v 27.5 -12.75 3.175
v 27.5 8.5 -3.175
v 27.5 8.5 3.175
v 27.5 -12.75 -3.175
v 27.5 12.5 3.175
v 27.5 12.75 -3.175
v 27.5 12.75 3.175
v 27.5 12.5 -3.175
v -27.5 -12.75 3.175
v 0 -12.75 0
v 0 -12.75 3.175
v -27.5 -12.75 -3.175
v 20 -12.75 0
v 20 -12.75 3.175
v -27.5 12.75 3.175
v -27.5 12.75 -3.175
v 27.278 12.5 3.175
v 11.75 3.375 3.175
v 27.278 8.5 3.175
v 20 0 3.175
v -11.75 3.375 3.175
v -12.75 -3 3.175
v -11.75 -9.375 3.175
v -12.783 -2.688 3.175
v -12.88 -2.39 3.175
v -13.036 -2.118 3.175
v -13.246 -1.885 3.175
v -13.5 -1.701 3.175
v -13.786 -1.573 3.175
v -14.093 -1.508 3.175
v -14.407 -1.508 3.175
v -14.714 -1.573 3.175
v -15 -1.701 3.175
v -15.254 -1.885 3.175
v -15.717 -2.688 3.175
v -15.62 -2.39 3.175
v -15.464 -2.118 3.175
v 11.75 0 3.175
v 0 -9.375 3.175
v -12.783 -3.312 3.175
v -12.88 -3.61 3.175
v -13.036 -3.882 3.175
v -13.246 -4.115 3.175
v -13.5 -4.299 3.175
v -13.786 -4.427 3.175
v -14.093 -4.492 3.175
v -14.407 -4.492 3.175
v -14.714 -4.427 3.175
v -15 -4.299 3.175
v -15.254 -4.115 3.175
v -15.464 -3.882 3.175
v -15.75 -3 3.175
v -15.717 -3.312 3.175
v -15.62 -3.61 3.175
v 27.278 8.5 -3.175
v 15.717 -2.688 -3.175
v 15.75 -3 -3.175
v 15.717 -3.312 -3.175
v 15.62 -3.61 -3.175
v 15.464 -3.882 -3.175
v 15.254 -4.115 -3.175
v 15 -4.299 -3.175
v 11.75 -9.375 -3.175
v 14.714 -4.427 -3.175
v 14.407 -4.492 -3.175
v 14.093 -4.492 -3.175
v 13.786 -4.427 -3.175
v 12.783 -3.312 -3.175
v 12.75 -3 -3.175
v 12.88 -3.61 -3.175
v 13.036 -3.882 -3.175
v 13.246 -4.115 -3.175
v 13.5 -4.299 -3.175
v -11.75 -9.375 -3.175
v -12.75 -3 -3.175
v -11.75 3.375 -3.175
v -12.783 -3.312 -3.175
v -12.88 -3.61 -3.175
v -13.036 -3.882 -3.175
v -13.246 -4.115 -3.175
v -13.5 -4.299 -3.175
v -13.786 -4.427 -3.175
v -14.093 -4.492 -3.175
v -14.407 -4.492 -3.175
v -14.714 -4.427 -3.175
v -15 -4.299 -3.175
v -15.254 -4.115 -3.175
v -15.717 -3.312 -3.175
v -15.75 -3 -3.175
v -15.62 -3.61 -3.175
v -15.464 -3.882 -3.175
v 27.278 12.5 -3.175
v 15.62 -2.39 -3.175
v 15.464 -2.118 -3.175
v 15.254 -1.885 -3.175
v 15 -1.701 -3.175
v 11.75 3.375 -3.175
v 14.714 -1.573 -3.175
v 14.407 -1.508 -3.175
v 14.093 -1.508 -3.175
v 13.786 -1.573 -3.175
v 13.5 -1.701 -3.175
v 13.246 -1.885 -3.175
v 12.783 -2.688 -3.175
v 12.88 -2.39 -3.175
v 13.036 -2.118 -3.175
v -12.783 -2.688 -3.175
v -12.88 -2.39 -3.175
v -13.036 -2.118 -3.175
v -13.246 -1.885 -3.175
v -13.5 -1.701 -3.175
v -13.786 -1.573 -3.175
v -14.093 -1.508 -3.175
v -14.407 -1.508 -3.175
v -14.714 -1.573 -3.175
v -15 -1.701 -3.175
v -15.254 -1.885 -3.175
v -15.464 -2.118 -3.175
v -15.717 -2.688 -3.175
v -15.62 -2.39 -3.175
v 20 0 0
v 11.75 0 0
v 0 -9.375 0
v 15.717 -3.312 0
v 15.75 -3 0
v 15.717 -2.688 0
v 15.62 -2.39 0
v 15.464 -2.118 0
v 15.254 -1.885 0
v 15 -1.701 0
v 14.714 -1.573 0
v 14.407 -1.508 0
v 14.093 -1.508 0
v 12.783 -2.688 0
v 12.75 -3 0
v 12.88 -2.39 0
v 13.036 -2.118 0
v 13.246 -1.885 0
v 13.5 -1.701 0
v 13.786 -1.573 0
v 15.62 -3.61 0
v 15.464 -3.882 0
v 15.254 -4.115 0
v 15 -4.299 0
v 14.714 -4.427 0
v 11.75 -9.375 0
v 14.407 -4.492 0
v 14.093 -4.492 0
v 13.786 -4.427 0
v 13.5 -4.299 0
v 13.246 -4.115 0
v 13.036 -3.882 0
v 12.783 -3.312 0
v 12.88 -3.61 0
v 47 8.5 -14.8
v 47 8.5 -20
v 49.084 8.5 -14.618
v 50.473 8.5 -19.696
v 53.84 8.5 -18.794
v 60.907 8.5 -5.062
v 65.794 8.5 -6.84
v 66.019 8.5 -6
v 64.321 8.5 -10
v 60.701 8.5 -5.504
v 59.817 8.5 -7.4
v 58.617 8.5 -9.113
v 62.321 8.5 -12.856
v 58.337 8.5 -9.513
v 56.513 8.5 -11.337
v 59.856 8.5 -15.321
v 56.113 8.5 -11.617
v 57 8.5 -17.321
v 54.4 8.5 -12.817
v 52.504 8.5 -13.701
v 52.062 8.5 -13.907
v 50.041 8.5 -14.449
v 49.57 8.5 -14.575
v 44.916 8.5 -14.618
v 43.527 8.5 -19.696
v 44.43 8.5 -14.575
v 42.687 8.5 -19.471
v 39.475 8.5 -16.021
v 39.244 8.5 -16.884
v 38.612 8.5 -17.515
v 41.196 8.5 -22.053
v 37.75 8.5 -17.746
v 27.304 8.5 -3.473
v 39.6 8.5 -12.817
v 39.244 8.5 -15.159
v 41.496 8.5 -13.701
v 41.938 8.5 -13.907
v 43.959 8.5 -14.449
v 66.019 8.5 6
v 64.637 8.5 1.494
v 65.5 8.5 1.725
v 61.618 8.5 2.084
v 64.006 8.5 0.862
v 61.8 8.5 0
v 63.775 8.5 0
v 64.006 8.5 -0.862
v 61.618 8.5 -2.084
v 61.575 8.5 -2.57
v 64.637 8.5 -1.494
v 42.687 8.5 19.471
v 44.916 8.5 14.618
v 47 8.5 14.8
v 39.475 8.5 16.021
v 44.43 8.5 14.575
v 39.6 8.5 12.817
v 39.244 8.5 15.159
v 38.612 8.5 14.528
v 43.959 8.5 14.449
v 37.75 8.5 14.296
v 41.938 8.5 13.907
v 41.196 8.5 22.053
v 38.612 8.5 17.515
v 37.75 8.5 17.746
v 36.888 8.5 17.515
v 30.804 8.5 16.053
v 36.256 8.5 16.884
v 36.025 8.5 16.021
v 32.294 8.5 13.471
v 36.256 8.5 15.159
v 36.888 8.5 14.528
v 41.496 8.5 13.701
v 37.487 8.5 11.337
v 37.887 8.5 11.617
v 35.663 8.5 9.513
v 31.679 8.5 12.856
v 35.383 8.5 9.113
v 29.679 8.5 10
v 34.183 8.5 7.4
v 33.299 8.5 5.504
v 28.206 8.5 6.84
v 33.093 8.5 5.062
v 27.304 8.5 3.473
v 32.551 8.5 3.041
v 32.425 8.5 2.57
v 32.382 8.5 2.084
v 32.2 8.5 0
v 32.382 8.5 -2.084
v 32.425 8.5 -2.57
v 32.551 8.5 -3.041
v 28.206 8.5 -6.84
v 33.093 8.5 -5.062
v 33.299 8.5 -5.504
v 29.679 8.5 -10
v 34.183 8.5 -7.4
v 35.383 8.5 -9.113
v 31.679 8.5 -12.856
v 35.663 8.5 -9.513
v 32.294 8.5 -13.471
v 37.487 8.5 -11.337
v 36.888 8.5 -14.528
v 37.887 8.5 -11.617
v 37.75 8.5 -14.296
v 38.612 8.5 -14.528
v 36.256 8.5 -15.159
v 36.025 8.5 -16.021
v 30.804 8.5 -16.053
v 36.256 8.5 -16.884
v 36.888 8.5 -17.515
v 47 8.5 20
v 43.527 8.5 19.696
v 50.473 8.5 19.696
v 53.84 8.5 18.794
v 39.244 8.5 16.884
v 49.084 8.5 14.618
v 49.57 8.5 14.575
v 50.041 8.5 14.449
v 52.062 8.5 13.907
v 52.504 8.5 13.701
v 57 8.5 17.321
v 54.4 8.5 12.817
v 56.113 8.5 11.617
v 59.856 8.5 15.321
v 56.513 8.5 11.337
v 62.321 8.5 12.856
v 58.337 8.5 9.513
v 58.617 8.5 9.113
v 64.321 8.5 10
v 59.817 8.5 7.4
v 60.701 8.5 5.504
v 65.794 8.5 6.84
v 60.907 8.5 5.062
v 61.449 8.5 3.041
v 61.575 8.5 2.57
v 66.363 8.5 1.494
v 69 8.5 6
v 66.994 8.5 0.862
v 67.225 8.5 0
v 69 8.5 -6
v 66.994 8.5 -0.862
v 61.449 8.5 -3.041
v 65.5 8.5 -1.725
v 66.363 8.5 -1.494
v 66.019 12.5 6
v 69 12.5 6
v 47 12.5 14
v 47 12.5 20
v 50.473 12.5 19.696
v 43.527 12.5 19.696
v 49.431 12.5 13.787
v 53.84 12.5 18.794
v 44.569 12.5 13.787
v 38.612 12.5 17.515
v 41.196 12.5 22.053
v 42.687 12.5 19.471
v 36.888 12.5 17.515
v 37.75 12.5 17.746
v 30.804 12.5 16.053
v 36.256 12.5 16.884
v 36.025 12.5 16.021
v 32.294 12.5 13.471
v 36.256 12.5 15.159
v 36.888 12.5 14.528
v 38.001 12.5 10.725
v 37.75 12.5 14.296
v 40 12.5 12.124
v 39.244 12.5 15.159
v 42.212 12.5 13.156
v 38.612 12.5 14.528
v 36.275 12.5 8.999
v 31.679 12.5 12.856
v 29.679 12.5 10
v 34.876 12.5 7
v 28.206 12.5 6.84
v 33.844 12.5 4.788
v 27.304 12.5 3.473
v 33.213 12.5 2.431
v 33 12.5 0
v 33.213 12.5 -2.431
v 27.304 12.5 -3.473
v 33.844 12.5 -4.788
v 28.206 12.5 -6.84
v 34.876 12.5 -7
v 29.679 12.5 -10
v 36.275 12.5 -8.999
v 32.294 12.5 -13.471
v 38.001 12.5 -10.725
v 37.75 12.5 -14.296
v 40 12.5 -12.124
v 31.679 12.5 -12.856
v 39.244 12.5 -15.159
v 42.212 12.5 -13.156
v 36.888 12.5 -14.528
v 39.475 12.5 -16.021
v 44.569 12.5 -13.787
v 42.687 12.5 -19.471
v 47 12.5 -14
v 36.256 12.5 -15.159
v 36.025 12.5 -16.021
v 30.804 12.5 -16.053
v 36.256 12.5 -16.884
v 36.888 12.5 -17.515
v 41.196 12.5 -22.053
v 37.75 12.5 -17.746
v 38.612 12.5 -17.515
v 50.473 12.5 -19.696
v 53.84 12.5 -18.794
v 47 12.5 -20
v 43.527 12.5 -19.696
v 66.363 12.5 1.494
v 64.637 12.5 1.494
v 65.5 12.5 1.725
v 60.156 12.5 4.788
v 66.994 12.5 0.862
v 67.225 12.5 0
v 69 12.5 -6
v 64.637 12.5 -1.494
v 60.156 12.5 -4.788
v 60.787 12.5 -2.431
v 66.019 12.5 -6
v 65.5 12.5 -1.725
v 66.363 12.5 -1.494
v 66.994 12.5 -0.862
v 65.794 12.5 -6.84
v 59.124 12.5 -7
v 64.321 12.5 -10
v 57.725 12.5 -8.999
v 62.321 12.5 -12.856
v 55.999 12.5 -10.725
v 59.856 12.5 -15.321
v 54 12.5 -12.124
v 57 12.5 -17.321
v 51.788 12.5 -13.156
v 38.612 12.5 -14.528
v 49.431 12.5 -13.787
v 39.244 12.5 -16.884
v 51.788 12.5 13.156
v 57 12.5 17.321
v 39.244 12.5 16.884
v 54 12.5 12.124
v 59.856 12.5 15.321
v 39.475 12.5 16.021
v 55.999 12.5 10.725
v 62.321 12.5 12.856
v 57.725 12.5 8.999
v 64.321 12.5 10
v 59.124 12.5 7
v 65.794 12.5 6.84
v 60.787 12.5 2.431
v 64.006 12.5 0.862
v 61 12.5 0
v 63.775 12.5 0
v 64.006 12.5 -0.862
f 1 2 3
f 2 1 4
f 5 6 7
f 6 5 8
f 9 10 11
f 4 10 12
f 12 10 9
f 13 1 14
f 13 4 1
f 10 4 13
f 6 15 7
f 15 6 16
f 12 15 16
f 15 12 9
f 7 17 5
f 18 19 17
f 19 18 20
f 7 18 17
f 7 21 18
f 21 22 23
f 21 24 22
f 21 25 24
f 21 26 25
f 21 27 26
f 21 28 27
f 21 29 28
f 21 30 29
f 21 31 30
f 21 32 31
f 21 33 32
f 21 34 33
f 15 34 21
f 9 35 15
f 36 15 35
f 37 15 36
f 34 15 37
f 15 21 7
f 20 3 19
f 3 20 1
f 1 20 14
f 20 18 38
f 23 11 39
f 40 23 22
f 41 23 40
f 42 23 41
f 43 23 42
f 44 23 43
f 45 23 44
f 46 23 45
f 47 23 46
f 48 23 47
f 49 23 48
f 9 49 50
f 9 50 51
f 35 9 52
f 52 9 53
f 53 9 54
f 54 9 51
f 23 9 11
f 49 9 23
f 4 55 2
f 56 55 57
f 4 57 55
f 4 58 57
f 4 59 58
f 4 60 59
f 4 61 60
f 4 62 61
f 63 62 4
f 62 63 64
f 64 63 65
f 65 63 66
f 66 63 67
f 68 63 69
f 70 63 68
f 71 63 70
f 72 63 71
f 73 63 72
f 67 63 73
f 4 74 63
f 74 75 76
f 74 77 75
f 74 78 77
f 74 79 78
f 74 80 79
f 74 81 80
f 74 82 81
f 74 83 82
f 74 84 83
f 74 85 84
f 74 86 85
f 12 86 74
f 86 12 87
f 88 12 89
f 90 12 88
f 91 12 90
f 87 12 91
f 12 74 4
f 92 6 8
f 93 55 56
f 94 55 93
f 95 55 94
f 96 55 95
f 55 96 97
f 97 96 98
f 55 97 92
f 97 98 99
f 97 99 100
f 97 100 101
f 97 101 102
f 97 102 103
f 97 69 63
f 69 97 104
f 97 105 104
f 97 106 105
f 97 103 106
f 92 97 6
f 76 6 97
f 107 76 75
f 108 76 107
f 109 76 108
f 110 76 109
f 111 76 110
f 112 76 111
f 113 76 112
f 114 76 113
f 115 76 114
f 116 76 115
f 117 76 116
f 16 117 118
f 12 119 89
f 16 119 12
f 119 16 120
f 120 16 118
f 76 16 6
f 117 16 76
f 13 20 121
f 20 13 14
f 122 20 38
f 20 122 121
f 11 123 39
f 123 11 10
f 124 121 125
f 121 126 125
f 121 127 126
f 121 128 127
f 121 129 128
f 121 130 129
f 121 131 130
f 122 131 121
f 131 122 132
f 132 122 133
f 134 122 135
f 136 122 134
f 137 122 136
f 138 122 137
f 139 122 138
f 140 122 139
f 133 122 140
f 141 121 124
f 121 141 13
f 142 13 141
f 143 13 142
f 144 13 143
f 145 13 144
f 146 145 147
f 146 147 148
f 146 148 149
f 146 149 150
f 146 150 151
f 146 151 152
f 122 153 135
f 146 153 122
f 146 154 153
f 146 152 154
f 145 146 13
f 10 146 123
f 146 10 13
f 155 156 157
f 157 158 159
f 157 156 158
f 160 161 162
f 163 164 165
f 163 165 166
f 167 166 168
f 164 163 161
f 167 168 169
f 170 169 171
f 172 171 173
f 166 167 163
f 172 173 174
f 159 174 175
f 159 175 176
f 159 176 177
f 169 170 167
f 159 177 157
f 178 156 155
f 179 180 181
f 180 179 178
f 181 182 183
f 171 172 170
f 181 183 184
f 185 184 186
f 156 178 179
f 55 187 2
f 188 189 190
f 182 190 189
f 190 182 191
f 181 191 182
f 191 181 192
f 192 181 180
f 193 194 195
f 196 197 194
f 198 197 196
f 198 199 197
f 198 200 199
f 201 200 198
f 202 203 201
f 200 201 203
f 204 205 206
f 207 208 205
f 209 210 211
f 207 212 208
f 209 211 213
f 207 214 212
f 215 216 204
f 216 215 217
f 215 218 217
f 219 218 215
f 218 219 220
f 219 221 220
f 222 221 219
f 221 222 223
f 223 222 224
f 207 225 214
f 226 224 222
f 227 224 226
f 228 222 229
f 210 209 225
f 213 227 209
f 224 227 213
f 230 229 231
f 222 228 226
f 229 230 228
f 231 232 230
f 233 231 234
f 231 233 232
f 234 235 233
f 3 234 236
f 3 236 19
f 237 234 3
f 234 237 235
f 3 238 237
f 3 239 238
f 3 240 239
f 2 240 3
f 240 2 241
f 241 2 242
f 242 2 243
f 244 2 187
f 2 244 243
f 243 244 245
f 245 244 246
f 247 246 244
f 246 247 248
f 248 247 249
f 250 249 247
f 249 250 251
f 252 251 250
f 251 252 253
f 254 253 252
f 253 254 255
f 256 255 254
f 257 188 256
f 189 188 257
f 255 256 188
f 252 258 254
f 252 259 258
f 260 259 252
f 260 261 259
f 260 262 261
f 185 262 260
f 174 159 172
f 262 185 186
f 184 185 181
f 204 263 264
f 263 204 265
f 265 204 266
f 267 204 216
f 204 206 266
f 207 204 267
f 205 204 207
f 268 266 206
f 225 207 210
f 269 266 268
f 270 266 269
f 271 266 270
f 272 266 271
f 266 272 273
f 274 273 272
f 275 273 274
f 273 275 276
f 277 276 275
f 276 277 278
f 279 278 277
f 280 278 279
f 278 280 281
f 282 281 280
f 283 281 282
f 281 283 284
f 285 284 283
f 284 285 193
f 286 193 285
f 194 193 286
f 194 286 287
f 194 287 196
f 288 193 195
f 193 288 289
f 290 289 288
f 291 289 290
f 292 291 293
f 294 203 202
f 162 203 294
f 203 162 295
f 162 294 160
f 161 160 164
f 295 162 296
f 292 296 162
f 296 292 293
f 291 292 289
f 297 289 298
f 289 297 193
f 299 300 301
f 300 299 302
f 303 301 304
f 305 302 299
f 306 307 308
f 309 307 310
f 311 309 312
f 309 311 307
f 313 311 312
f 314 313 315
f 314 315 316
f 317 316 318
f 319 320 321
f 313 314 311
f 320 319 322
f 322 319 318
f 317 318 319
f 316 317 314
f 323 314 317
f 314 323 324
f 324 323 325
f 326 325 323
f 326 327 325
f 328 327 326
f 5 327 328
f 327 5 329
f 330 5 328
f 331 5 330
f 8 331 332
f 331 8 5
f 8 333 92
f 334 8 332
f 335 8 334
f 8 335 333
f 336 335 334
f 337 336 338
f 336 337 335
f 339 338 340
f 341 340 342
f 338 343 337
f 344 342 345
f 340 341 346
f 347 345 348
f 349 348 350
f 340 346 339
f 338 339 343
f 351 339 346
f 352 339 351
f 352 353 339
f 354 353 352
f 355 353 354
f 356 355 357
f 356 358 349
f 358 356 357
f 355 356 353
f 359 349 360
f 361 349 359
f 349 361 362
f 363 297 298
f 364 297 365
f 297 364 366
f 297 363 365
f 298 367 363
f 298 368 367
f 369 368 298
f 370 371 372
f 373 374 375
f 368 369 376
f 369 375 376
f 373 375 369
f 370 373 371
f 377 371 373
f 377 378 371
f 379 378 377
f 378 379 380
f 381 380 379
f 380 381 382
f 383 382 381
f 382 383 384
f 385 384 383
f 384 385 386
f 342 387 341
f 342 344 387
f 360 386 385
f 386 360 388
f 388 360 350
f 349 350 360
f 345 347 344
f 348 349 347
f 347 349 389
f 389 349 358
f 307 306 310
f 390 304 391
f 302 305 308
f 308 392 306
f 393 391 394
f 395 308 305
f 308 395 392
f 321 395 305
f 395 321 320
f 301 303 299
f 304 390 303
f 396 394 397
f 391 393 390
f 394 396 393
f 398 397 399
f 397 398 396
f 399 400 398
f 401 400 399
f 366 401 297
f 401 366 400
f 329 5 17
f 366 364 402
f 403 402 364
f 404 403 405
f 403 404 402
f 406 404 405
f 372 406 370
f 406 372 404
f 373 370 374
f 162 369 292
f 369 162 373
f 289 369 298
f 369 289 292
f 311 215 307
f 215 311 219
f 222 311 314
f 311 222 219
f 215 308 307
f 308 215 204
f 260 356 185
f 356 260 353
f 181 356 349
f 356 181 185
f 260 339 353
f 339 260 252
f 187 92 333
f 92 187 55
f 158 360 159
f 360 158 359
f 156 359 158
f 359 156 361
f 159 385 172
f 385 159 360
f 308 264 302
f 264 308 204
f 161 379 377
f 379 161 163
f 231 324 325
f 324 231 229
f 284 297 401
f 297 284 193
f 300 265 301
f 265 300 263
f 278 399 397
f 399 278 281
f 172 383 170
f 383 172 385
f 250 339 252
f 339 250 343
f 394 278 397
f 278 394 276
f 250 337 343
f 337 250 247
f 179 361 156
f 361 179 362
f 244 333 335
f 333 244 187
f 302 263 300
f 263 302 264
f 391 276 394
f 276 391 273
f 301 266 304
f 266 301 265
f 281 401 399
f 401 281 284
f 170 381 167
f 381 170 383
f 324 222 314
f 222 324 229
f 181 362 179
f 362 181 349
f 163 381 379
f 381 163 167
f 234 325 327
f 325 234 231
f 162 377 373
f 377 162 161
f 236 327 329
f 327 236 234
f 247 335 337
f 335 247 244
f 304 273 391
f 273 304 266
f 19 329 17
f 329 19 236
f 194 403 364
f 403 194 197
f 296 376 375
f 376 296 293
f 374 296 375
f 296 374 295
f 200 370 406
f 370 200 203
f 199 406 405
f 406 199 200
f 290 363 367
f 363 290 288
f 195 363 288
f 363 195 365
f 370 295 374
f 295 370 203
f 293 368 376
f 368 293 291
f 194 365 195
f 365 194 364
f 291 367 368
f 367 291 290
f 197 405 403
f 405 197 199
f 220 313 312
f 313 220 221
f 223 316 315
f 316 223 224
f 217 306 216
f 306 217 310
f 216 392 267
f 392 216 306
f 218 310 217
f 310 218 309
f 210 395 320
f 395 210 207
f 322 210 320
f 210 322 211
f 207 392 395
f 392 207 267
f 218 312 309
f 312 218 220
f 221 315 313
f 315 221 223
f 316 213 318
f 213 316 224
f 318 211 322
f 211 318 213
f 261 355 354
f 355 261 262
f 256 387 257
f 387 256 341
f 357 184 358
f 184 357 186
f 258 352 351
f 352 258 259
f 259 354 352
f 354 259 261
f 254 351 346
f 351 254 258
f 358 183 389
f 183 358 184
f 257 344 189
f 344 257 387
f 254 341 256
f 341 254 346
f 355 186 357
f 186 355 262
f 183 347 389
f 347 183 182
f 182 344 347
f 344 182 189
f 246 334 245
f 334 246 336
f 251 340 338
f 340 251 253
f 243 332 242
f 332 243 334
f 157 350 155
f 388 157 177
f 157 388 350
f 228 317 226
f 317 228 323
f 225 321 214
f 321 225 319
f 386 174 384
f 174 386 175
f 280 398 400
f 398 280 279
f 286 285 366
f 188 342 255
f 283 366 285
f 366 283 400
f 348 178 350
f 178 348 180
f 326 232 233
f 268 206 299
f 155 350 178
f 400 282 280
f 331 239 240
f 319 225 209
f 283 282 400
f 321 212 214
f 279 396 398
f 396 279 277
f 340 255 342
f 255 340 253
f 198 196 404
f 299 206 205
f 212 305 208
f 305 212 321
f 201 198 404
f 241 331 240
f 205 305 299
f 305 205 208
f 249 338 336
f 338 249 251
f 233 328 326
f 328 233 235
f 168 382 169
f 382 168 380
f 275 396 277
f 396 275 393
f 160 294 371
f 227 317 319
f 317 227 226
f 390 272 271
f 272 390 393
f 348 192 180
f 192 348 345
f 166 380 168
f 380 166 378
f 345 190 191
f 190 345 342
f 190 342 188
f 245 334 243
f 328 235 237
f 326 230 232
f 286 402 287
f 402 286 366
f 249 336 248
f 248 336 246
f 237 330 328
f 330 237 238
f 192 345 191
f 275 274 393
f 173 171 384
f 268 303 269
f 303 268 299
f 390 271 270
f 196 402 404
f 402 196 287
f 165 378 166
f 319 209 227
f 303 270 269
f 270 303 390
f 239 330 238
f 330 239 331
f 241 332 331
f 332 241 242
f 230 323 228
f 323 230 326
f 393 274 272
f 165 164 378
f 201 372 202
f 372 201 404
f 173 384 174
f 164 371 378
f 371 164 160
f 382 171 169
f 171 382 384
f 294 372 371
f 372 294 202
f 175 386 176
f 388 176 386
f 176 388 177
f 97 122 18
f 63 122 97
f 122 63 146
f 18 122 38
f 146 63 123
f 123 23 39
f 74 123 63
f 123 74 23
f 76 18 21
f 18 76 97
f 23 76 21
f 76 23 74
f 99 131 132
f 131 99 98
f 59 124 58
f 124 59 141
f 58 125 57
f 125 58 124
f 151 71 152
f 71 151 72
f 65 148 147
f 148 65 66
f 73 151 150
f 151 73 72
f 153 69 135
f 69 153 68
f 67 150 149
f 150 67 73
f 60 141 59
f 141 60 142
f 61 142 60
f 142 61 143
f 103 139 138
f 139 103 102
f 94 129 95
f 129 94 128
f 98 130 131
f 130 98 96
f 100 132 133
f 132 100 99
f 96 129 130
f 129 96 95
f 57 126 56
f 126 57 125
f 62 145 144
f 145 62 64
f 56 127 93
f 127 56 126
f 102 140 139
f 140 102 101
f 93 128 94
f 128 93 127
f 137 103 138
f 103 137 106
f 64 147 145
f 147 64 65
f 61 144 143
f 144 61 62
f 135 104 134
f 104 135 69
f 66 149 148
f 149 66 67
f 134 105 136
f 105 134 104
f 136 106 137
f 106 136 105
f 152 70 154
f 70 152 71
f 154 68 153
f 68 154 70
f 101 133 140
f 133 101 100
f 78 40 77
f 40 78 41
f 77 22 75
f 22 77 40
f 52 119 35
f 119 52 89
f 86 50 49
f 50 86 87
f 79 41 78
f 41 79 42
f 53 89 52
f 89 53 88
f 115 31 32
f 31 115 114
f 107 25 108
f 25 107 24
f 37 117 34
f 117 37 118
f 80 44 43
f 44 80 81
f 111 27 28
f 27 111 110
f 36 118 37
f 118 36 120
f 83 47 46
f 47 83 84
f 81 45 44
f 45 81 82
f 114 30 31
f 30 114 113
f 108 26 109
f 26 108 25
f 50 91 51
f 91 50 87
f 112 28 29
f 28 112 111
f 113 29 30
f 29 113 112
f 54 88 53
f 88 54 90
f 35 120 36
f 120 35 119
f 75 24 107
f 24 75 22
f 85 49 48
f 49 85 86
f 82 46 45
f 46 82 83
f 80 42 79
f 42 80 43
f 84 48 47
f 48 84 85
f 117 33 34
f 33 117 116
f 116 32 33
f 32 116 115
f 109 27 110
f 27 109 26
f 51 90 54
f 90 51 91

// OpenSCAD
// file: configuration.scad
// Increase this if your slicer or printer make holes too tight.
extra_radius = 0.1;

// OD = outside diameter, corner to corner.
m3_nut_od = 6.1;
m3_nut_radius = m3_nut_od/2 + 0.2 + extra_radius;

// Major diameter of metric 3mm thread.
m3_major = 2.85;
m3_radius = m3_major/2 + extra_radius;
m3_wide_radius = m3_major/2 + extra_radius + 0.2;

// NEMA17 stepper motors.
motor_shaft_diameter = 5;
motor_shaft_radius = motor_shaft_diameter/2 + extra_radius;

// Frame brackets. M3x8mm screws work best with 3.6 mm brackets.
thickness = 3.6;

// OpenBeam or Misumi. Currently only 15x15 mm, but there is a plan
// to make models more parametric and allow 20x20 mm in the future.
extrusion = 15;
// main file
//////////////////////////////////////////////////////////////////////////////////////
// Mount for a servo for autoleveling
// modified servo_mount.scad 12/12/13 by zennmaster (thing:167440)
// last modified: 12/14/13
/////////////////////////////////////////////////////////////////////////////////////
include <configuration.scad>;
// From Auto Bed Level
// http://www.thingiverse.com/thing:209384/#files
separation = 44;  // Distance between ball joint mounting faces.
offset = 22;  // Same as DELTA_EFFECTOR_OFFSET in Marlin.
mount_radius = 18.5;  // Hotend mounting screws, standard would be 25mm.
hotend_radius = 14;  // Hole for the hotend (J-Head diameter is 16mm).
height = 4;
cone_r1 = 2.5;
cone_r2 = 14;

servo_width=23.5;  // Width of cutout for servo.
servo_height=12.75; // Height of cutout for servo. 
servo_bolt_size=3; // Diameter of bolt shaft
mount_bolt_size = 3.2;

rotate([90,0,0]) // Lay it down for printing:

union(){
	difference(){
		mainblock();
		translate([0,0,3])
		servo_hole();
	}
}

module mainblock() { //Set up the "blank" part:
	difference() {
		block();
		rotate([90,0,0])
			translate([0,17.25,0])
				cylinder (h=10,r=2, $fn=30, center = true);
	}
}

module block(){
	// Main body:
    difference() {
       cube([55,6.35,25.5], true);
       translate(20,6.35,50) cube([20,6.35,20]);
    }
    
	// mount
	difference() {
         rotate([0,0,270]) translate([0,47,-10.5]) effector([45,38.5,6.35],true);
		//mounting screw holes
		translate([15,30,-20]) rotate([0,0,0])cylinder(h=20,r=mount_bolt_size/2,$fn=50);
		translate([-15,30,-20]) rotate([0,0,0])cylinder(h=20,r=mount_bolt_size/2,$fn=50);
        

	}
}

module servo_hole(){ // Make the opening for the servo.  Adjust the variables above to fir your part.
	cube([servo_width,10,servo_height], true);
	translate([servo_width/2 + servo_bolt_size/2 +1 ,0,0])
		rotate([90,0,0])
			cylinder (h=10,r=servo_bolt_size/2, $fn=30, center = true);
		translate([-servo_width/2 - servo_bolt_size/2-1,0,0])
			rotate([90,0,0])
				cylinder (h=10,r=servo_bolt_size/2, $fn=30, center = true);
}

module effector() {
  difference() {
    union() {
      cylinder(r=offset-2, h=height, center=true, $fn=36);
      for (a = [60:120:359]) rotate([0, 0, a]) {
	rotate([0, 0, 30]) translate([offset-2, 0, 0])
	  cube([4, 12, height], center=true);
      }
    }
    translate([0, 0, -height/2])
	cylinder(r1=hotend_radius, r2=hotend_radius+1, h=height+1, $fn=36);
    for (a = [0:120:359]) rotate([0, 0, a]) {
      translate([0, mount_radius, 0])
	cylinder(r=m3_wide_radius, h=2*height, center=true, $fn=12);
    }
  }
}
